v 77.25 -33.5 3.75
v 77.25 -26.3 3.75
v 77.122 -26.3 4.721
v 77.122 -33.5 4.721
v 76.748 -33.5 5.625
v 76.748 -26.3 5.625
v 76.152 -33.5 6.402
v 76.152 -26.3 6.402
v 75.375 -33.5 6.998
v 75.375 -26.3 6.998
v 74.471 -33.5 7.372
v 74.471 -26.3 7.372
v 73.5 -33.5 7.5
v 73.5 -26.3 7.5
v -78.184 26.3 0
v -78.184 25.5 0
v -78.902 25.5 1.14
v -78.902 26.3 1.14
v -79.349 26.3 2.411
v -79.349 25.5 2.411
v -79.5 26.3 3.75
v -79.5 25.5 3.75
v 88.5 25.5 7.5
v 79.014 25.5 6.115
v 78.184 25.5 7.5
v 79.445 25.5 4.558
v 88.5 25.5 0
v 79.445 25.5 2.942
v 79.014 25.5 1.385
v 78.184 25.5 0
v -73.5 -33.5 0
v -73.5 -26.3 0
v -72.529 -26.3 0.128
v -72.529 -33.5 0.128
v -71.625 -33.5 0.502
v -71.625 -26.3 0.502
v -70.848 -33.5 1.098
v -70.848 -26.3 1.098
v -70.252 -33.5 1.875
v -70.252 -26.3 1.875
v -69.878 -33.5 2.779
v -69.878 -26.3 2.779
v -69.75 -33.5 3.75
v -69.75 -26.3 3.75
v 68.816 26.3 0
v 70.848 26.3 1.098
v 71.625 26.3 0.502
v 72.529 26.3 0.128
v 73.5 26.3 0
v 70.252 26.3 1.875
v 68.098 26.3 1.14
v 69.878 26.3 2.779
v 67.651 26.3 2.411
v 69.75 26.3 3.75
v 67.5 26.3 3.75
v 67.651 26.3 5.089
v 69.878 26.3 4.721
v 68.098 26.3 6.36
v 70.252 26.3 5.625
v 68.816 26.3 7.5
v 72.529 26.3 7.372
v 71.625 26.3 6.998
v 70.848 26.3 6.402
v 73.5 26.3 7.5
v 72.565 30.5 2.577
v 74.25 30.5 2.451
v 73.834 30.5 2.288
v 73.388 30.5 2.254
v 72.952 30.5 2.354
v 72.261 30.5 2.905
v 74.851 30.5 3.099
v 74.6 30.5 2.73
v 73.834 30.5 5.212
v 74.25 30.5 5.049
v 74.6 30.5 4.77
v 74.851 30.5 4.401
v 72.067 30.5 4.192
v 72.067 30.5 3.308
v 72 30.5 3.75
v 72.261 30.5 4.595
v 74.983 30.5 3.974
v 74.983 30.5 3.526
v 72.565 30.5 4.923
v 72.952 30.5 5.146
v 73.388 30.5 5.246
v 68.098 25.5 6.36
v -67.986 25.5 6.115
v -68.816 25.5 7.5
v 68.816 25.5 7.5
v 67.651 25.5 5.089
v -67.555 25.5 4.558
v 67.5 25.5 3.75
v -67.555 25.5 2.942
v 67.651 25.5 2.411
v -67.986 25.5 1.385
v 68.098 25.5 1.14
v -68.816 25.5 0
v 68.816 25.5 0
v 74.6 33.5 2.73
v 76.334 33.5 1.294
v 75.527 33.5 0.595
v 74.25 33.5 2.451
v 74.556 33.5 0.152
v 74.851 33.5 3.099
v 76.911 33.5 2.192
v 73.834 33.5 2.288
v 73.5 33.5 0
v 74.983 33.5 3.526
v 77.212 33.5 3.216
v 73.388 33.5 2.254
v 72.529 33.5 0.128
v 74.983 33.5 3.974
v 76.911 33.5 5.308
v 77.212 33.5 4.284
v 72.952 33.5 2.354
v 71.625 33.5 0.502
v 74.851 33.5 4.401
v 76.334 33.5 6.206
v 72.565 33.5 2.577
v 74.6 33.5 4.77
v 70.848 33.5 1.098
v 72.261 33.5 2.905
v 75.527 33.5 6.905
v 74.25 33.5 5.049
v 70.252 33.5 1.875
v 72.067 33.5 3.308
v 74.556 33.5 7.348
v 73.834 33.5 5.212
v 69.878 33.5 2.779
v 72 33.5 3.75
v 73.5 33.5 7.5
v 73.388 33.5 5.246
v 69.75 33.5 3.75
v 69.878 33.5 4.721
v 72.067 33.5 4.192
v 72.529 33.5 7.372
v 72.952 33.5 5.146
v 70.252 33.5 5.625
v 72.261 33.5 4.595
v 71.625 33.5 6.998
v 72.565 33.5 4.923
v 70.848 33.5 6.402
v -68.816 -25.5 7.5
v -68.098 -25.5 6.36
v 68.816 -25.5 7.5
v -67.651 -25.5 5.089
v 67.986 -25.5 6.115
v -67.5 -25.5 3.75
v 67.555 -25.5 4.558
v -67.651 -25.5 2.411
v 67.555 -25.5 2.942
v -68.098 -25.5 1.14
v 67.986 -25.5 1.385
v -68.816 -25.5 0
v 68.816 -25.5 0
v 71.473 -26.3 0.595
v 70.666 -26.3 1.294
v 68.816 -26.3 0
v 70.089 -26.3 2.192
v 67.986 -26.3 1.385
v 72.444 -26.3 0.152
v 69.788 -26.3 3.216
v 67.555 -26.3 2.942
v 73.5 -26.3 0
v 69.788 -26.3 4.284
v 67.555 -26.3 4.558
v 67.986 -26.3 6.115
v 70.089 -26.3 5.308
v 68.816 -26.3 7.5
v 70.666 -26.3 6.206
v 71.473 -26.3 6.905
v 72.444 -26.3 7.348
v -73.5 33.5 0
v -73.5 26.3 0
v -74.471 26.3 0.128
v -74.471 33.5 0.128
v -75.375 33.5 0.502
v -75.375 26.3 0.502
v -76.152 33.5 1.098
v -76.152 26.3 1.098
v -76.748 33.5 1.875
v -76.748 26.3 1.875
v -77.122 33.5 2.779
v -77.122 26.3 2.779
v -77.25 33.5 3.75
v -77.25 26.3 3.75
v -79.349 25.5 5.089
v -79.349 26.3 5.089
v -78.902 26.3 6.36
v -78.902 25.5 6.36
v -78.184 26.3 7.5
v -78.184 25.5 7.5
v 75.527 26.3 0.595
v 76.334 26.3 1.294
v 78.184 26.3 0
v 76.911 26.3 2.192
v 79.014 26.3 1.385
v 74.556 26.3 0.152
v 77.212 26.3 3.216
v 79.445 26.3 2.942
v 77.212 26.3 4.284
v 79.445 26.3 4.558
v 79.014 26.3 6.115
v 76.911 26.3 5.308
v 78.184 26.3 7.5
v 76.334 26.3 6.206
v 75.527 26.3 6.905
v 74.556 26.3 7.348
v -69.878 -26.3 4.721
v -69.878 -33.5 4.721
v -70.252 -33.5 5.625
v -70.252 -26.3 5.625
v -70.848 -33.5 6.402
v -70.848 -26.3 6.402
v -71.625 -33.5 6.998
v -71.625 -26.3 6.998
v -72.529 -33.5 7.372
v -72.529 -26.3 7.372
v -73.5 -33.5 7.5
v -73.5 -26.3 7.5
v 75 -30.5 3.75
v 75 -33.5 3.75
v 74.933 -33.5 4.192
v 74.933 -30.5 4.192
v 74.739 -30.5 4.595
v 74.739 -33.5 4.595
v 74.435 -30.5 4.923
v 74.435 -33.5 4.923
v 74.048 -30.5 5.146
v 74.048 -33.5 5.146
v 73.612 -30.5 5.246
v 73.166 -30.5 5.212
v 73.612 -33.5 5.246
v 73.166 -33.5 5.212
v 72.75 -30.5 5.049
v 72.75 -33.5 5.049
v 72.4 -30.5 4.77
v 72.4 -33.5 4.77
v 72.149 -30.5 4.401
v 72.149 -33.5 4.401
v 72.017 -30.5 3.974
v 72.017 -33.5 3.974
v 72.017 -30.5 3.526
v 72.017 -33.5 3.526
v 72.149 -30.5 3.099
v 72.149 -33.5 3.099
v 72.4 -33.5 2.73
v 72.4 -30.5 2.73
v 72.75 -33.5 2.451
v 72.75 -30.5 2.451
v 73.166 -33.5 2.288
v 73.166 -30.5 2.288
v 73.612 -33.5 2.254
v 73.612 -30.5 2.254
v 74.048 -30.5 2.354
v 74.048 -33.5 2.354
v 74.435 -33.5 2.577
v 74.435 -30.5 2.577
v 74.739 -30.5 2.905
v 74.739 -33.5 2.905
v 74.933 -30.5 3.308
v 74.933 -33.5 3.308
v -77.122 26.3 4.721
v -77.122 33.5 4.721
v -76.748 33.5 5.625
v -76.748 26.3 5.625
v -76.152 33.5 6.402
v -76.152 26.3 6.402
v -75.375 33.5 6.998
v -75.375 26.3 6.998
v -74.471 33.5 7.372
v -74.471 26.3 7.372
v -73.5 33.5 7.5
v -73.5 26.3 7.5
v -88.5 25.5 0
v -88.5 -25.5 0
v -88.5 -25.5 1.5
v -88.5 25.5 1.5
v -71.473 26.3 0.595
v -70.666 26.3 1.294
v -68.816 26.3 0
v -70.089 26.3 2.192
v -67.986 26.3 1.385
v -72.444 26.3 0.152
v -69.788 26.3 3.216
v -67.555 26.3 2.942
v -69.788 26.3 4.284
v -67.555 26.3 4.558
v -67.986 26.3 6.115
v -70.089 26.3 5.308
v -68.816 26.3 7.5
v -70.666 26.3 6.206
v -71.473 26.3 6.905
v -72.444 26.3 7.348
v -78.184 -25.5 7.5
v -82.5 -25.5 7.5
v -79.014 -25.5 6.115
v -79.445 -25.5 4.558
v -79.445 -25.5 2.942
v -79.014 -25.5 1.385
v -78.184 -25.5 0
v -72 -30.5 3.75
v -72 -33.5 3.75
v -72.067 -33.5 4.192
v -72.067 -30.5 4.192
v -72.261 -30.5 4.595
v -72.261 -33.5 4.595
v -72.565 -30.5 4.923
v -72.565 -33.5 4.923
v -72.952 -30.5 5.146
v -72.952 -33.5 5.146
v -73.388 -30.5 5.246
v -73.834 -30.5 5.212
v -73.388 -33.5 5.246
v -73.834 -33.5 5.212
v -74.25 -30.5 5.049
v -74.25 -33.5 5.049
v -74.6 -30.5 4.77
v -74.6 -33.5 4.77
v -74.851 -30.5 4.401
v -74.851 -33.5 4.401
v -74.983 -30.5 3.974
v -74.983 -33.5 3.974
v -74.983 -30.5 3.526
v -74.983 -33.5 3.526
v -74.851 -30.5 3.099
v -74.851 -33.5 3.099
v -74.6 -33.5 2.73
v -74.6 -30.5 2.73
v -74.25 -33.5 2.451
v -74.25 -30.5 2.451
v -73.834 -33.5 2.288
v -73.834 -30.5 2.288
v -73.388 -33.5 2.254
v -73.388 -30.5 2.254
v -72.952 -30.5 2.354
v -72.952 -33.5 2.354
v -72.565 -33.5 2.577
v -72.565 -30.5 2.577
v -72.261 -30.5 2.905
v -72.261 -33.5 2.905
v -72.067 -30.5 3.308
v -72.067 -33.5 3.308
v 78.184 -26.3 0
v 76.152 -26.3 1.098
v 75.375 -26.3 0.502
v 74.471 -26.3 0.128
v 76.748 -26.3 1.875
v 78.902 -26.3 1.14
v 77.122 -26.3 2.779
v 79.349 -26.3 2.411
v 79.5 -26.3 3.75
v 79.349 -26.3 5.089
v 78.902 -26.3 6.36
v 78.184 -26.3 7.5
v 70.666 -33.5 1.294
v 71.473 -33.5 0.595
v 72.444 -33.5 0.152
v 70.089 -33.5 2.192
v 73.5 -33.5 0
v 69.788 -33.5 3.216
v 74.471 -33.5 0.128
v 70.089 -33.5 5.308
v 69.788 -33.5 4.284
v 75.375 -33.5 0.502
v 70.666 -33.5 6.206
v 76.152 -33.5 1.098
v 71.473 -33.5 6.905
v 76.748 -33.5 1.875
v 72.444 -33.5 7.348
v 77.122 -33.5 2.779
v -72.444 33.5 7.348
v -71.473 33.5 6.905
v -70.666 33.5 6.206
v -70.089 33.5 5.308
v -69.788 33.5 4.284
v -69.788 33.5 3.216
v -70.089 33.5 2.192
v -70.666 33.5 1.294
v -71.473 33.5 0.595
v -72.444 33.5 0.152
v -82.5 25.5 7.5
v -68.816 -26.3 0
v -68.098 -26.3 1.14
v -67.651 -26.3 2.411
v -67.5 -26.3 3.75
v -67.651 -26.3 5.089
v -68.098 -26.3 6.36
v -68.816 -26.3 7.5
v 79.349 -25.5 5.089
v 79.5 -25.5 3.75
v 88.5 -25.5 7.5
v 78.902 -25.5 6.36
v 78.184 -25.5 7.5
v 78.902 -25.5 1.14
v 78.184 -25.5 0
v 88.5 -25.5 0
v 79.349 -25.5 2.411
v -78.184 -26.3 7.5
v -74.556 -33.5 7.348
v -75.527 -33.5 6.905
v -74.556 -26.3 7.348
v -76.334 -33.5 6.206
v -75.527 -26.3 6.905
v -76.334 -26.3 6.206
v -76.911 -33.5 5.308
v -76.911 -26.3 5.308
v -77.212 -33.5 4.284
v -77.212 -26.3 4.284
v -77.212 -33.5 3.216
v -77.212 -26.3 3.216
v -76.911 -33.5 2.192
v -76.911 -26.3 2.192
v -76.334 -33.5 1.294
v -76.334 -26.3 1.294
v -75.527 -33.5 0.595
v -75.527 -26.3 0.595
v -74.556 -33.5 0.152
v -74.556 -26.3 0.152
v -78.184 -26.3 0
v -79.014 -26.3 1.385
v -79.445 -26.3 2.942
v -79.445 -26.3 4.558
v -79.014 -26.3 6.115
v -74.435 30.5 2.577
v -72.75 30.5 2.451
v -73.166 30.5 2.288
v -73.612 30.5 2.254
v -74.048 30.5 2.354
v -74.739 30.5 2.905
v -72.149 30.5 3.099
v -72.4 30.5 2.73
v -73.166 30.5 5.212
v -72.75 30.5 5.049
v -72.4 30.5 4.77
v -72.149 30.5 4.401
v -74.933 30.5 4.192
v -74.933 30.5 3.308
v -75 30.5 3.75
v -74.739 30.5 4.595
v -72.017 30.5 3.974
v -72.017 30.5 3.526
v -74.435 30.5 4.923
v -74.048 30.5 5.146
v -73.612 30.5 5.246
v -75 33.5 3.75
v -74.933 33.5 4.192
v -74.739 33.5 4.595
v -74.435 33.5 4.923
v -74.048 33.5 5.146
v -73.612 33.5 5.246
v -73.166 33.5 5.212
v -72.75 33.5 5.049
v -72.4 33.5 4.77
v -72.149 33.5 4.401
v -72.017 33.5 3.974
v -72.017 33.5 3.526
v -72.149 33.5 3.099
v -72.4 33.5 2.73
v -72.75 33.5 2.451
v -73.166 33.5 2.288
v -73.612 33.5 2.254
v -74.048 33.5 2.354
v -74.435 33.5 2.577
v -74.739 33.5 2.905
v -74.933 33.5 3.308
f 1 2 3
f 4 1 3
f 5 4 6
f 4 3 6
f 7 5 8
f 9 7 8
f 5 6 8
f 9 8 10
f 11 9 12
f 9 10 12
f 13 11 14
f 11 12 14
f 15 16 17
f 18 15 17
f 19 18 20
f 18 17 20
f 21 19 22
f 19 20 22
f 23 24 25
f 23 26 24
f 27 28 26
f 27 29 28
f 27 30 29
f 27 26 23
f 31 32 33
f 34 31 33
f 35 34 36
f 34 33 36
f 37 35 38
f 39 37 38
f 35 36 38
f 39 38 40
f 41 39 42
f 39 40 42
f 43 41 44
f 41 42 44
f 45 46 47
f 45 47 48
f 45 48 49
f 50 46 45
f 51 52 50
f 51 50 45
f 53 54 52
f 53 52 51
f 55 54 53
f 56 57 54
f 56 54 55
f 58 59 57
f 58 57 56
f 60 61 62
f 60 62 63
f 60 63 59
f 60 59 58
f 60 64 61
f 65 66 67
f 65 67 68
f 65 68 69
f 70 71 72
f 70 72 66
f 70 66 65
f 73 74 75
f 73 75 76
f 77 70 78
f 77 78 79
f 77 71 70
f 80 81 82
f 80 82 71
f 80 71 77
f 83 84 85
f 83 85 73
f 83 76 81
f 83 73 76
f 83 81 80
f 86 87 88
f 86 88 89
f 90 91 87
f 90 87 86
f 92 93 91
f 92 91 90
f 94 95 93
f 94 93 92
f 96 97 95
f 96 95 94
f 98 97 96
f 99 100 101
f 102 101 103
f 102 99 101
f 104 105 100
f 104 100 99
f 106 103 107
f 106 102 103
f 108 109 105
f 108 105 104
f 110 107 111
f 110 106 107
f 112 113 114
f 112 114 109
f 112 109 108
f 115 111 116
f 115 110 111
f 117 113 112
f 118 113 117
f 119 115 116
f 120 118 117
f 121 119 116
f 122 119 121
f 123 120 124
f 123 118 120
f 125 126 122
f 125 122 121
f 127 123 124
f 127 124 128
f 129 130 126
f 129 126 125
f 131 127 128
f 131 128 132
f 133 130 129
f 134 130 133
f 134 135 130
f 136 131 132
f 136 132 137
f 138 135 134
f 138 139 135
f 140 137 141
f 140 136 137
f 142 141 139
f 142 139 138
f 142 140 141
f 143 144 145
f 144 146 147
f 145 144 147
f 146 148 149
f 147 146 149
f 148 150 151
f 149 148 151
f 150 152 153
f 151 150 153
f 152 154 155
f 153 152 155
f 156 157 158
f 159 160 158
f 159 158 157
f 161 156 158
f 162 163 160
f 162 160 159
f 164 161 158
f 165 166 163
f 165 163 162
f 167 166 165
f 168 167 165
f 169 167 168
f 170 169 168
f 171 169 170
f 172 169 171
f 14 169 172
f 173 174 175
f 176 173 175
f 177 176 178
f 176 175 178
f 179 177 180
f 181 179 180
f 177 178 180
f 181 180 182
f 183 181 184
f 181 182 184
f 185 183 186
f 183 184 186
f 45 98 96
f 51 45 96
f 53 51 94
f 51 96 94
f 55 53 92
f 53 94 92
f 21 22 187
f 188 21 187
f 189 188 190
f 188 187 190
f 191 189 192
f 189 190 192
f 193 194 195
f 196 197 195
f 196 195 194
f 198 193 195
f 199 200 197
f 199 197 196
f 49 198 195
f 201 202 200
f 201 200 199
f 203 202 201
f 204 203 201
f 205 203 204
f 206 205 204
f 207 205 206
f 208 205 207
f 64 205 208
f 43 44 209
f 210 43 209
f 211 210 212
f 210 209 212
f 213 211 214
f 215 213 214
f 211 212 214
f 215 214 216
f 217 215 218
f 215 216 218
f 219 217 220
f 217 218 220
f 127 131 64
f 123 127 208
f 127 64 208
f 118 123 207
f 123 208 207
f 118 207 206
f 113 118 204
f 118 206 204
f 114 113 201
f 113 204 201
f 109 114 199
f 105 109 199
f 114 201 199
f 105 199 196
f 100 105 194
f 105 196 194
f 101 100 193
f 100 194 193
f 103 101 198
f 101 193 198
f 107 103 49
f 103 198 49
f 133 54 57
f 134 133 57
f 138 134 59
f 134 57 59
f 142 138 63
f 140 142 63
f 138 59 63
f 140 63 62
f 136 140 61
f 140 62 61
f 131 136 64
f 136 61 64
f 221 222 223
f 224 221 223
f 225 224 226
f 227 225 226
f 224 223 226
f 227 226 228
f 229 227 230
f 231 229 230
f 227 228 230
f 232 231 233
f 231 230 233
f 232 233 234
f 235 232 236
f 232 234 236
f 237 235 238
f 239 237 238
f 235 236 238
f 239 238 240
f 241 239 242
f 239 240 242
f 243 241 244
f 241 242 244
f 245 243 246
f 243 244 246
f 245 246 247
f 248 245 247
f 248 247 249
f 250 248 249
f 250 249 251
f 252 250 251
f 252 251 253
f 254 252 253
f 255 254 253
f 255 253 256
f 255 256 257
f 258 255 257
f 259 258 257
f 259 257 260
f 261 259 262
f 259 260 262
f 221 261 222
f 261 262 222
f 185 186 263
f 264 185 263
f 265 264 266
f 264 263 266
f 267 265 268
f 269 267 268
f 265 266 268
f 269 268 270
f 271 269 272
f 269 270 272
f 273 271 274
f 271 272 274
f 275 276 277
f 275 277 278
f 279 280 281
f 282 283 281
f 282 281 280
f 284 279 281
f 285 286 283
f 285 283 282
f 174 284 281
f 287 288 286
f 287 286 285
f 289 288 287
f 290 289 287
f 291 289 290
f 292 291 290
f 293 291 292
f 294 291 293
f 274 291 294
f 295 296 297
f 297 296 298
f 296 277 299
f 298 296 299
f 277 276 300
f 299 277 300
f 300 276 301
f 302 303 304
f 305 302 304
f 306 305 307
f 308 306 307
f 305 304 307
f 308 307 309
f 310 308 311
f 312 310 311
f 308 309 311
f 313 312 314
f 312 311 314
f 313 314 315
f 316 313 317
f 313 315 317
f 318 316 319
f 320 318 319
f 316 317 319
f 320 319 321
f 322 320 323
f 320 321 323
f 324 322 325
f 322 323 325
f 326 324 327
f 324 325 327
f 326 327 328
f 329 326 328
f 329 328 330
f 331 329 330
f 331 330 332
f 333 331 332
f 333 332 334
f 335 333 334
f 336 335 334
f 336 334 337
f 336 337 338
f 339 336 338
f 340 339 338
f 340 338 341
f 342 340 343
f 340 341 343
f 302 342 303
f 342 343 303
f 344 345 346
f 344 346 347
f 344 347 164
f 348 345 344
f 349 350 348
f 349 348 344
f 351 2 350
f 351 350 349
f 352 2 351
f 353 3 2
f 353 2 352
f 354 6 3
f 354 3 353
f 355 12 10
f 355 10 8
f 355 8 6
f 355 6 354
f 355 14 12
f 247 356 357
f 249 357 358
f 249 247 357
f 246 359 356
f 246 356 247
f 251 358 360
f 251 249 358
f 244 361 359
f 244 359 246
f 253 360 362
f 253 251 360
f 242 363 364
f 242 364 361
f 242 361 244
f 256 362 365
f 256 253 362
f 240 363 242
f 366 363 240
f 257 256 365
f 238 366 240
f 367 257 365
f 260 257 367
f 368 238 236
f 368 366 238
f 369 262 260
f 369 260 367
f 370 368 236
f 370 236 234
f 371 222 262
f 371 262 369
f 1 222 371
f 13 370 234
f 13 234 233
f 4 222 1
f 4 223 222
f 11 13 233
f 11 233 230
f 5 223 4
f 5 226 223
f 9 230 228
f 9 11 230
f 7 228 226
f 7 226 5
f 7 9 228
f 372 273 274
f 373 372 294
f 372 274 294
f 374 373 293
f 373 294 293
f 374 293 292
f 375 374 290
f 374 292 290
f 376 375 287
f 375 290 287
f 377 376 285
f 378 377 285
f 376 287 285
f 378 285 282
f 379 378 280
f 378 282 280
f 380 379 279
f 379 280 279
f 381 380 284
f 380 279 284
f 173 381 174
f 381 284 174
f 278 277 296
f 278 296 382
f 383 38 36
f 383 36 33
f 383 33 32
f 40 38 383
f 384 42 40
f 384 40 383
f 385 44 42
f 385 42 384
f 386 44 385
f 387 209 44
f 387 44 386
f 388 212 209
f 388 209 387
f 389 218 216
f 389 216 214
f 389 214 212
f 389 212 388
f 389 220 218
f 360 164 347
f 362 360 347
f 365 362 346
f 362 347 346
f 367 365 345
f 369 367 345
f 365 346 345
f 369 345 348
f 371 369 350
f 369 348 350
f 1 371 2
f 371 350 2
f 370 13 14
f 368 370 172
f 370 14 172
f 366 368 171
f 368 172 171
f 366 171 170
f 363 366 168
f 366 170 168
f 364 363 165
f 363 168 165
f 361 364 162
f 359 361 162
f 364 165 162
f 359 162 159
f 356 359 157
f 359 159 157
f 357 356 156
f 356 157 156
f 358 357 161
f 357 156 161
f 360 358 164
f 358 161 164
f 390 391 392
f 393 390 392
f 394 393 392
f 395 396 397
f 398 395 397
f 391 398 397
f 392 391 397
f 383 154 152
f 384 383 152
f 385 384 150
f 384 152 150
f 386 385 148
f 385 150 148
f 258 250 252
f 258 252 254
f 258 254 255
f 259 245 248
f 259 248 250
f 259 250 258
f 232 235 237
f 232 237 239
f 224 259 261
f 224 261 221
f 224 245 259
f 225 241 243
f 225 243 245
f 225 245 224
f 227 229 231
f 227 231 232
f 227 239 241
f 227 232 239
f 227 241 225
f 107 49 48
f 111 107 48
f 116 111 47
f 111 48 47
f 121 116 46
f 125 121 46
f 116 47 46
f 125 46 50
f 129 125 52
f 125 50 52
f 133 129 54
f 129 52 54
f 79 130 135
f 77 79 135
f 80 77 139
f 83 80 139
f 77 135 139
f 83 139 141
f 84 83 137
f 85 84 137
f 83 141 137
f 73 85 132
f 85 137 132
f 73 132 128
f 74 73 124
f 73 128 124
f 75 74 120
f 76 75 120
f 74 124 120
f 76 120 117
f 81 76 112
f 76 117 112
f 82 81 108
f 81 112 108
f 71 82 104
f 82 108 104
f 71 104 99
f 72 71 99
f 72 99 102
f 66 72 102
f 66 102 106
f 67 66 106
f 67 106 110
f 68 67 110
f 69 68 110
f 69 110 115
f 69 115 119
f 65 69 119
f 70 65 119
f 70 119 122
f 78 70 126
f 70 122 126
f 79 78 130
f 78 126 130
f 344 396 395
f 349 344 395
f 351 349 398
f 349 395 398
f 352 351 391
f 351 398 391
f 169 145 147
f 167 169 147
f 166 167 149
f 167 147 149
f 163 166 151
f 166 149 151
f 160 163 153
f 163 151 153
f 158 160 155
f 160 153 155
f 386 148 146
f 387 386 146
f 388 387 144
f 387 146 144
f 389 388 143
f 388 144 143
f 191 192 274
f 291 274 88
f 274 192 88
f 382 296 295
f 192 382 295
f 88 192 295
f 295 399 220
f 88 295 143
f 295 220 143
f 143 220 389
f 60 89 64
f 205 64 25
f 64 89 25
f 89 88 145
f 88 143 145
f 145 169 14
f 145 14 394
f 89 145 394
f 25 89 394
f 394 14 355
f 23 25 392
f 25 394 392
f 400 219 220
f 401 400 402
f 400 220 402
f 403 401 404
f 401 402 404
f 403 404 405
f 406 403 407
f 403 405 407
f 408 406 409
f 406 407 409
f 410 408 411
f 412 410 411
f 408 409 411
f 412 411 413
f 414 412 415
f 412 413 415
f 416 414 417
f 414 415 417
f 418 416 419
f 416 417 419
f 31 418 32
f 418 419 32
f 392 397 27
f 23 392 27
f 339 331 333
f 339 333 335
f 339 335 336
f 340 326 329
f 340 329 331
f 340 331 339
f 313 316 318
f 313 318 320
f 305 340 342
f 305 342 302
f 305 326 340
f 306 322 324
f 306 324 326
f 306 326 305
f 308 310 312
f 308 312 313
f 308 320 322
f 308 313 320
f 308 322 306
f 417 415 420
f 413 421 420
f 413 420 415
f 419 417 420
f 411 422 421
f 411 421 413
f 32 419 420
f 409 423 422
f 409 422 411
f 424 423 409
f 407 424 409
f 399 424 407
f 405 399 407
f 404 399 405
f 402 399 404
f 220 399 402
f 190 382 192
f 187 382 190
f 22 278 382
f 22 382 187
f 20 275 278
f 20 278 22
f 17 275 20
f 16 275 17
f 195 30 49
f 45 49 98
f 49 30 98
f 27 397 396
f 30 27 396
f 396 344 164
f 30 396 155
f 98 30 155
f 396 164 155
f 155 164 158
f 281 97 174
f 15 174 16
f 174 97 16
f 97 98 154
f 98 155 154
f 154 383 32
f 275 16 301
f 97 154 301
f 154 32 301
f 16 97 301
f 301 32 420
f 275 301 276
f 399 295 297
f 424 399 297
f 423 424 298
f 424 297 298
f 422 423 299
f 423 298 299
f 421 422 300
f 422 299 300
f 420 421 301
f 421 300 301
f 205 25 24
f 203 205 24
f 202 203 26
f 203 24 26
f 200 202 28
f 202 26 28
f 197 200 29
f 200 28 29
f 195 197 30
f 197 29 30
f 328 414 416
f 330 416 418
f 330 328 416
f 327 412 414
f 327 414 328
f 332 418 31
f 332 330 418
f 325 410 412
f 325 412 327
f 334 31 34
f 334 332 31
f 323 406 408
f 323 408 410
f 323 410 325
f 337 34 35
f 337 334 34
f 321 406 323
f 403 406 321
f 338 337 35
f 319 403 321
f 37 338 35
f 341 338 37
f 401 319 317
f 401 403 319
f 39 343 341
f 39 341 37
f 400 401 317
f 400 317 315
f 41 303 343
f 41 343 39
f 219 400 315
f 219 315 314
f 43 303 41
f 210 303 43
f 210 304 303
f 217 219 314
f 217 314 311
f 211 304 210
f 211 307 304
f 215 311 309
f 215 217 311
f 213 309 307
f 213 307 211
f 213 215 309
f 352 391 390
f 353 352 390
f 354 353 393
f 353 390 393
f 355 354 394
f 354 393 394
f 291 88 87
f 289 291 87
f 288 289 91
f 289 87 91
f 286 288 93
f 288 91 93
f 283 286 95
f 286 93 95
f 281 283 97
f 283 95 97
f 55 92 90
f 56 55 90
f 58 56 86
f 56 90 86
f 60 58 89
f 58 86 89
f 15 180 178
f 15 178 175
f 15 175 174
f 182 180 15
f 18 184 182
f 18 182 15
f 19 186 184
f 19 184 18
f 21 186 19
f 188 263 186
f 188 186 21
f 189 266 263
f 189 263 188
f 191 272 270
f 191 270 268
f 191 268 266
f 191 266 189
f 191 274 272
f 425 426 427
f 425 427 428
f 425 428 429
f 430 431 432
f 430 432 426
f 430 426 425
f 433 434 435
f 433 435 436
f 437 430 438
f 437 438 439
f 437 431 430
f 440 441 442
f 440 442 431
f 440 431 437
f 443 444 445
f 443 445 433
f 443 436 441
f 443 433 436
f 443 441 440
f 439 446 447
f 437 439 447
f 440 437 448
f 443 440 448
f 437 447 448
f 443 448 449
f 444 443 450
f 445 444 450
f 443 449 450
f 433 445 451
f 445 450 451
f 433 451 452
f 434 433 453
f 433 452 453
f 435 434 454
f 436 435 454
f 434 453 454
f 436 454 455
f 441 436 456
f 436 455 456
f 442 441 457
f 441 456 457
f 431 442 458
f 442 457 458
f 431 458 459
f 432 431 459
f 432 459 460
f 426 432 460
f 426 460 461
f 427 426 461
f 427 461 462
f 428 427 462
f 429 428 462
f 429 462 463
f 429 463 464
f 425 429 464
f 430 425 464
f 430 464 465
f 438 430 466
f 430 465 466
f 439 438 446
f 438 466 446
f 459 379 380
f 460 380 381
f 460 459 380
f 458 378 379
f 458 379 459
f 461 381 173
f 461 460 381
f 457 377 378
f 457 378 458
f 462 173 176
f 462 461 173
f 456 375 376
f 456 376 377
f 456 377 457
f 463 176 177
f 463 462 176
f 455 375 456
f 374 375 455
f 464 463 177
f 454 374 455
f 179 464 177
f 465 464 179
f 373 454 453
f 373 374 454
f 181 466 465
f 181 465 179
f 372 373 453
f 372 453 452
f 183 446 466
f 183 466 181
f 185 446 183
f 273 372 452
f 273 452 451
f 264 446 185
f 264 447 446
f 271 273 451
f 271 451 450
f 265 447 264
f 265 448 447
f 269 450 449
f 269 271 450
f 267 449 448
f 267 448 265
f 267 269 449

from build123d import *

# Parameters (mm, degrees)
F0_W      = 177
F0_H      = 51
F1_DEPTH  = 7.5
F3_DEPTH  = 8
F4_DEPTH  = 0.8
F5_R      = 1.5
F6_DEPTH  = 3
F8_DEPTH  = 8
F9_DEPTH  = 0.8
F10_R     = 1.5
F11_DEPTH = 3
F12_SIZE  = 6


with BuildPart() as f1:
    # F0 (on Top) → F1 (new body)
    with BuildSketch(Plane.XY):
        Rectangle(F0_W, F0_H)
    extrude(amount=F1_DEPTH)

    # F2 (on face) → F3 (join)
    with BuildSketch(Plane.XZ.offset(25.5)):
        with BuildLine():
            ThreePointArc((77.25, 3.75), (76.1516504294, 6.4016504294), (73.5, 7.5))
            ThreePointArc((73.5, 7.5), (69.75, 3.75), (73.5, 0))
            ThreePointArc((73.5, 0), (76.1516504294, 1.0983495706), (77.25, 3.75))
        make_face()
        with BuildLine():
            ThreePointArc((-73.5, 0), (-70.8483495706, 1.0983495706), (-69.75, 3.75))
            ThreePointArc((-69.75, 3.75), (-70.8483495706, 6.4016504294), (-73.5, 7.5))
            ThreePointArc((-73.5, 7.5), (-77.25, 3.75), (-73.5, 0))
        make_face()
    extrude(amount=F3_DEPTH)

    # F2 (on face) → F4 (join)
    with BuildSketch(Plane.XZ.offset(25.5)):
        with BuildLine():
            ThreePointArc((-73.5, 0), (-77.25, 3.75), (-73.5, 7.5))
            Line((-73.5, 7.5), (-78.1837484988, 7.5))
            ThreePointArc((-78.1837484988, 7.5), (-79.5, 3.75), (-78.1837484988, 0))
            Line((-78.1837484988, 0), (-73.5, 0))
        make_face()
        with BuildLine():
            ThreePointArc((-73.5, 7.5), (-70.8483495706, 6.4016504294), (-69.75, 3.75))
            ThreePointArc((-69.75, 3.75), (-70.8483495706, 1.0983495706), (-73.5, 0))
            Line((-73.5, 0), (-68.8162515012, 0))
            ThreePointArc((-68.8162515012, 0), (-67.8386180577, 1.7628526719), (-67.5, 3.75))
            ThreePointArc((-67.5, 3.75), (-67.8386180577, 5.7371473281), (-68.8162515012, 7.5))
            Line((-68.8162515012, 7.5), (-73.5, 7.5))
        make_face()
        with BuildLine():
            ThreePointArc((79.5, 3.75), (79.1613819423, 5.7371473281), (78.1837484988, 7.5))
            Line((78.1837484988, 7.5), (73.5, 7.5))
            ThreePointArc((73.5, 7.5), (76.1516504294, 6.4016504294), (77.25, 3.75))
            ThreePointArc((77.25, 3.75), (76.1516504294, 1.0983495706), (73.5, 0))
            Line((73.5, 0), (78.1837484988, 0))
            ThreePointArc((78.1837484988, 0), (79.1613819423, 1.7628526719), (79.5, 3.75))
        make_face()
        with BuildLine():
            Line((73.5, 7.5), (68.8162515012, 7.5))
            ThreePointArc((68.8162515012, 7.5), (67.5, 3.75), (68.8162515012, 0))
            Line((68.8162515012, 0), (73.5, 0))
            ThreePointArc((73.5, 0), (69.75, 3.75), (73.5, 7.5))
        make_face()
    extrude(amount=F4_DEPTH)

    # F5 (on face) → F6 (cut)
    with BuildSketch(Plane.XZ.offset(33.5)):
        with Locations((-73.5, 3.75)):
            Circle(F5_R)
        with Locations((73.5, 3.75)):
            Circle(F5_R)
    extrude(amount=-F6_DEPTH, mode=Mode.SUBTRACT)

    # F7 (on face) → F8 (join)
    with BuildSketch(Plane(origin=(0, 25.5, 0), x_dir=(-1, 0, 0), z_dir=(0, 1, 0))):
        with BuildLine():
            ThreePointArc((77.25, 3.75), (76.1516504294, 6.4016504294), (73.5, 7.5))
            ThreePointArc((73.5, 7.5), (69.75, 3.75), (73.5, 0))
            ThreePointArc((73.5, 0), (76.1516504294, 1.0983495706), (77.25, 3.75))
        make_face()
        with BuildLine():
            ThreePointArc((-73.5, 0), (-70.8483495706, 1.0983495706), (-69.75, 3.75))
            ThreePointArc((-69.75, 3.75), (-70.8483495706, 6.4016504294), (-73.5, 7.5))
            ThreePointArc((-73.5, 7.5), (-77.25, 3.75), (-73.5, 0))
        make_face()
    extrude(amount=F8_DEPTH)

    # F7 (on face) → F9 (join)
    with BuildSketch(Plane(origin=(0, 25.5, 0), x_dir=(-1, 0, 0), z_dir=(0, 1, 0))):
        with BuildLine():
            Line((73.5, 7.5), (68.8162515012, 7.5))
            ThreePointArc((68.8162515012, 7.5), (67.5, 3.75), (68.8162515012, 0))
            Line((68.8162515012, 0), (73.5, 0))
            ThreePointArc((73.5, 0), (69.75, 3.75), (73.5, 7.5))
        make_face()
        with BuildLine():
            ThreePointArc((79.5, 3.75), (79.1613819423, 5.7371473281), (78.1837484988, 7.5))
            Line((78.1837484988, 7.5), (73.5, 7.5))
            ThreePointArc((73.5, 7.5), (76.1516504294, 6.4016504294), (77.25, 3.75))
            ThreePointArc((77.25, 3.75), (76.1516504294, 1.0983495706), (73.5, 0))
            Line((73.5, 0), (78.1837484988, 0))
            ThreePointArc((78.1837484988, 0), (79.1613819423, 1.7628526719), (79.5, 3.75))
        make_face()
        with BuildLine():
            ThreePointArc((-73.5, 0), (-77.25, 3.75), (-73.5, 7.5))
            Line((-73.5, 7.5), (-78.1837484988, 7.5))
            ThreePointArc((-78.1837484988, 7.5), (-79.5, 3.75), (-78.1837484988, 0))
            Line((-78.1837484988, 0), (-73.5, 0))
        make_face()
        with BuildLine():
            ThreePointArc((-73.5, 7.5), (-70.8483495706, 6.4016504294), (-69.75, 3.75))
            ThreePointArc((-69.75, 3.75), (-70.8483495706, 1.0983495706), (-73.5, 0))
            Line((-73.5, 0), (-68.8162515012, 0))
            ThreePointArc((-68.8162515012, 0), (-67.8386180577, 1.7628526719), (-67.5, 3.75))
            ThreePointArc((-67.5, 3.75), (-67.8386180577, 5.7371473281), (-68.8162515012, 7.5))
            Line((-68.8162515012, 7.5), (-73.5, 7.5))
        make_face()
    extrude(amount=F9_DEPTH)

    # F10 (on face) → F11 (cut)
    with BuildSketch(Plane(origin=(0, 33.5, 0), x_dir=(-1, 0, 0), z_dir=(0, 1, 0))):
        with Locations((-73.5, 3.75)):
            Circle(F10_R)
        with Locations((73.5, 3.75)):
            Circle(F10_R)
    extrude(amount=-F11_DEPTH, mode=Mode.SUBTRACT)

    # F12
    f12_edges = [f1.edges().sort_by_distance(p)[0] for p in [
        (-88.5, 0, 7.5),
    ]]
    chamfer(f12_edges, length=F12_SIZE)


solid = f1.part
